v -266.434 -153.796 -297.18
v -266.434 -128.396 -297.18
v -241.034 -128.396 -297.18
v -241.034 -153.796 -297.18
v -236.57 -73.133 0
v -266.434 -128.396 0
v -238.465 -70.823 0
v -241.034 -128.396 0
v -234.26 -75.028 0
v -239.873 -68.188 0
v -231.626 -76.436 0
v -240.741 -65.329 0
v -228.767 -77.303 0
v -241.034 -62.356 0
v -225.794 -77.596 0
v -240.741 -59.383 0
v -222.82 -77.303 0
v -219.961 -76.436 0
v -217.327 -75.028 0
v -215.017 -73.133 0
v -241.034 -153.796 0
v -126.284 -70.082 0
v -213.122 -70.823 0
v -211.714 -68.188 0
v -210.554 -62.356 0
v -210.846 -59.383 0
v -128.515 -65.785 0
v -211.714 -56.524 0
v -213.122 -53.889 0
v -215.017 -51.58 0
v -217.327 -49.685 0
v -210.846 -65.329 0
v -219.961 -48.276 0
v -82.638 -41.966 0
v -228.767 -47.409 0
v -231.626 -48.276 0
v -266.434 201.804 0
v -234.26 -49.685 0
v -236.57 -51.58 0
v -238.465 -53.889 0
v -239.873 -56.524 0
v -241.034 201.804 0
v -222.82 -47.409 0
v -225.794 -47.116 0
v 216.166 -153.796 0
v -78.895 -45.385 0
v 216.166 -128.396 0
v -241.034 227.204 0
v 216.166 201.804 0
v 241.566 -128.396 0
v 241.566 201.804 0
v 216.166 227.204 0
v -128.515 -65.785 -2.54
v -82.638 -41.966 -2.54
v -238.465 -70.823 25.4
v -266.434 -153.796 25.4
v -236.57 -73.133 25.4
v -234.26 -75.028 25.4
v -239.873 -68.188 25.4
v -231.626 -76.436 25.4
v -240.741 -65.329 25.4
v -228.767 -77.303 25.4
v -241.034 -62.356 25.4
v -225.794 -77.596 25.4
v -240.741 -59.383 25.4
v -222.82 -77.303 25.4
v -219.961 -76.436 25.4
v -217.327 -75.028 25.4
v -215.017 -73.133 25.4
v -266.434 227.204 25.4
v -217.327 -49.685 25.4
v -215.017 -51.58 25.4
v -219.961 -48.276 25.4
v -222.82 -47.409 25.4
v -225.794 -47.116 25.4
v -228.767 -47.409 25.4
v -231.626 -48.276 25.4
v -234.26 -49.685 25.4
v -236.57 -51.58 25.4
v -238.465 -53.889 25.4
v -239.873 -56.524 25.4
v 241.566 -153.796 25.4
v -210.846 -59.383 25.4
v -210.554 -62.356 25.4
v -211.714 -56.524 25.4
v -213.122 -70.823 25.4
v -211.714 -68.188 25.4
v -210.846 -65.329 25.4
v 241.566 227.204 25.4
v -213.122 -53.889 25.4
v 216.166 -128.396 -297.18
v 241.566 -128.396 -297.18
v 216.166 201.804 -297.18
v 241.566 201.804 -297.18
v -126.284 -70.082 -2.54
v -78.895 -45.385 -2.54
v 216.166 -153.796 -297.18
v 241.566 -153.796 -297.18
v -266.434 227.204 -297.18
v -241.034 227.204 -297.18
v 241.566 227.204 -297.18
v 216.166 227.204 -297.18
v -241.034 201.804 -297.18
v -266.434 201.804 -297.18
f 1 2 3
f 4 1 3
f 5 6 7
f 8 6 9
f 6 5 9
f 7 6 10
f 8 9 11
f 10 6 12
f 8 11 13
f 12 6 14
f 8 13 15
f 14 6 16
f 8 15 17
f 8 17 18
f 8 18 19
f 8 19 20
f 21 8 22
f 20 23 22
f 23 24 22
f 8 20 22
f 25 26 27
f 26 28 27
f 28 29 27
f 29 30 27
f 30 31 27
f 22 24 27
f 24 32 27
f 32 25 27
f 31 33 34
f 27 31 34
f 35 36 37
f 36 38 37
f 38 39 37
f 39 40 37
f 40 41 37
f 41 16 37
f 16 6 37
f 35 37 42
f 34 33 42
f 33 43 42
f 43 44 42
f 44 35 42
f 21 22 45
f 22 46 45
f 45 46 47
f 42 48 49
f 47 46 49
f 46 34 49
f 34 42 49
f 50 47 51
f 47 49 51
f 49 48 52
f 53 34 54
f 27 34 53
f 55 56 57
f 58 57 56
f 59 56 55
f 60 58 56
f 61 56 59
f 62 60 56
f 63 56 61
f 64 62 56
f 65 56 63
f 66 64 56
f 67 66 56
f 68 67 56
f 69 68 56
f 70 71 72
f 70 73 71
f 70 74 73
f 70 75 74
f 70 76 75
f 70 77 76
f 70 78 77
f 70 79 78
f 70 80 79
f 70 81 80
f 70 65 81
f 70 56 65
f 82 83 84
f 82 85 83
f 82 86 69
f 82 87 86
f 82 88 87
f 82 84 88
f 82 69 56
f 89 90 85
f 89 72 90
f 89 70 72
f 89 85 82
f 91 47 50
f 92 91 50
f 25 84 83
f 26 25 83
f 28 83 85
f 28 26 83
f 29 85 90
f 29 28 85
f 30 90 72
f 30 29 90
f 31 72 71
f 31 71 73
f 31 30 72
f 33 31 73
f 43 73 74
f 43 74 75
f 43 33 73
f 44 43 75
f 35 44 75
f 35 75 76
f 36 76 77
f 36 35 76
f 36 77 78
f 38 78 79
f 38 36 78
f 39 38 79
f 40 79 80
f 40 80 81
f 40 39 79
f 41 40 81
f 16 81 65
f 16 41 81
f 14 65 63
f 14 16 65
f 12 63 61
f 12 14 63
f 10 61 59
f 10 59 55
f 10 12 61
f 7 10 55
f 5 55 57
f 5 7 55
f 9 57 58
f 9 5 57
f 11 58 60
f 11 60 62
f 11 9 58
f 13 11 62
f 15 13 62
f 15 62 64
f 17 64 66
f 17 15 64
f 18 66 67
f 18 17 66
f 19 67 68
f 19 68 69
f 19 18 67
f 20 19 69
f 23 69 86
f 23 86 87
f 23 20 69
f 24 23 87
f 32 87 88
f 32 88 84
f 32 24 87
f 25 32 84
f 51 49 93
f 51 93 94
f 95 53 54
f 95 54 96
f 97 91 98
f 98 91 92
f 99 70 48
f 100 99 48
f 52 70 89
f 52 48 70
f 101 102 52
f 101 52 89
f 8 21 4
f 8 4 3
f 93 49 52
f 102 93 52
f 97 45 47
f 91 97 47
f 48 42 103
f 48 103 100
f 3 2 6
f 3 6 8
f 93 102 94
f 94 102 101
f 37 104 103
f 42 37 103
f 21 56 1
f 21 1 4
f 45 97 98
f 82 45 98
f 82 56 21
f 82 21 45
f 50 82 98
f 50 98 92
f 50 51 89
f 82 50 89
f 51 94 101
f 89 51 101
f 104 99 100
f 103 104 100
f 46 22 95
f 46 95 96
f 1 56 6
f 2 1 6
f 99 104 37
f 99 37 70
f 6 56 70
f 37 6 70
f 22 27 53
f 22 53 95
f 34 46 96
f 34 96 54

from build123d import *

# Parameters (mm, degrees)
F2_W     = 508
F2_H     = 381
F2_R     = 15.24
F3_DEPTH = 25.4
F4_W     = 25.4
F4_H     = 25.4
F5_DEPTH = 297.18
F7_DEPTH = 2.54


with BuildPart() as f3:
    # F2 (on face) → F3 (new body)
    with BuildSketch(Plane.XY):
        with Locations((-12.433536, 36.703804)):
            Rectangle(F2_W, F2_H)
        with Locations((-225.793536, -62.356196)):
            Circle(F2_R, mode=Mode.SUBTRACT)
    extrude(amount=F3_DEPTH)

    # F4 (on face) → F5 (join)
    with BuildSketch(Plane.XY):
        with Locations((-253.733536, -141.096196)):
            Rectangle(F4_W, F4_H)
        with Locations((228.866464, 214.503804)):
            Rectangle(F4_W, F4_H)
        with Locations((228.866464, -141.096196)):
            Rectangle(F4_W, F4_H)
        with Locations((-253.733536, 214.503804)):
            Rectangle(F4_W, F4_H)
    extrude(amount=-F5_DEPTH)

    # F6 (on face) → F7 (join)
    with BuildSketch(Plane.XY):
        Polygon((-78.894847, -45.385379), (-82.638033, -41.965879), (-128.514952, -65.7849), (-126.283888, -70.082069), align=None)
    extrude(amount=-F7_DEPTH)


solid = f3.part
